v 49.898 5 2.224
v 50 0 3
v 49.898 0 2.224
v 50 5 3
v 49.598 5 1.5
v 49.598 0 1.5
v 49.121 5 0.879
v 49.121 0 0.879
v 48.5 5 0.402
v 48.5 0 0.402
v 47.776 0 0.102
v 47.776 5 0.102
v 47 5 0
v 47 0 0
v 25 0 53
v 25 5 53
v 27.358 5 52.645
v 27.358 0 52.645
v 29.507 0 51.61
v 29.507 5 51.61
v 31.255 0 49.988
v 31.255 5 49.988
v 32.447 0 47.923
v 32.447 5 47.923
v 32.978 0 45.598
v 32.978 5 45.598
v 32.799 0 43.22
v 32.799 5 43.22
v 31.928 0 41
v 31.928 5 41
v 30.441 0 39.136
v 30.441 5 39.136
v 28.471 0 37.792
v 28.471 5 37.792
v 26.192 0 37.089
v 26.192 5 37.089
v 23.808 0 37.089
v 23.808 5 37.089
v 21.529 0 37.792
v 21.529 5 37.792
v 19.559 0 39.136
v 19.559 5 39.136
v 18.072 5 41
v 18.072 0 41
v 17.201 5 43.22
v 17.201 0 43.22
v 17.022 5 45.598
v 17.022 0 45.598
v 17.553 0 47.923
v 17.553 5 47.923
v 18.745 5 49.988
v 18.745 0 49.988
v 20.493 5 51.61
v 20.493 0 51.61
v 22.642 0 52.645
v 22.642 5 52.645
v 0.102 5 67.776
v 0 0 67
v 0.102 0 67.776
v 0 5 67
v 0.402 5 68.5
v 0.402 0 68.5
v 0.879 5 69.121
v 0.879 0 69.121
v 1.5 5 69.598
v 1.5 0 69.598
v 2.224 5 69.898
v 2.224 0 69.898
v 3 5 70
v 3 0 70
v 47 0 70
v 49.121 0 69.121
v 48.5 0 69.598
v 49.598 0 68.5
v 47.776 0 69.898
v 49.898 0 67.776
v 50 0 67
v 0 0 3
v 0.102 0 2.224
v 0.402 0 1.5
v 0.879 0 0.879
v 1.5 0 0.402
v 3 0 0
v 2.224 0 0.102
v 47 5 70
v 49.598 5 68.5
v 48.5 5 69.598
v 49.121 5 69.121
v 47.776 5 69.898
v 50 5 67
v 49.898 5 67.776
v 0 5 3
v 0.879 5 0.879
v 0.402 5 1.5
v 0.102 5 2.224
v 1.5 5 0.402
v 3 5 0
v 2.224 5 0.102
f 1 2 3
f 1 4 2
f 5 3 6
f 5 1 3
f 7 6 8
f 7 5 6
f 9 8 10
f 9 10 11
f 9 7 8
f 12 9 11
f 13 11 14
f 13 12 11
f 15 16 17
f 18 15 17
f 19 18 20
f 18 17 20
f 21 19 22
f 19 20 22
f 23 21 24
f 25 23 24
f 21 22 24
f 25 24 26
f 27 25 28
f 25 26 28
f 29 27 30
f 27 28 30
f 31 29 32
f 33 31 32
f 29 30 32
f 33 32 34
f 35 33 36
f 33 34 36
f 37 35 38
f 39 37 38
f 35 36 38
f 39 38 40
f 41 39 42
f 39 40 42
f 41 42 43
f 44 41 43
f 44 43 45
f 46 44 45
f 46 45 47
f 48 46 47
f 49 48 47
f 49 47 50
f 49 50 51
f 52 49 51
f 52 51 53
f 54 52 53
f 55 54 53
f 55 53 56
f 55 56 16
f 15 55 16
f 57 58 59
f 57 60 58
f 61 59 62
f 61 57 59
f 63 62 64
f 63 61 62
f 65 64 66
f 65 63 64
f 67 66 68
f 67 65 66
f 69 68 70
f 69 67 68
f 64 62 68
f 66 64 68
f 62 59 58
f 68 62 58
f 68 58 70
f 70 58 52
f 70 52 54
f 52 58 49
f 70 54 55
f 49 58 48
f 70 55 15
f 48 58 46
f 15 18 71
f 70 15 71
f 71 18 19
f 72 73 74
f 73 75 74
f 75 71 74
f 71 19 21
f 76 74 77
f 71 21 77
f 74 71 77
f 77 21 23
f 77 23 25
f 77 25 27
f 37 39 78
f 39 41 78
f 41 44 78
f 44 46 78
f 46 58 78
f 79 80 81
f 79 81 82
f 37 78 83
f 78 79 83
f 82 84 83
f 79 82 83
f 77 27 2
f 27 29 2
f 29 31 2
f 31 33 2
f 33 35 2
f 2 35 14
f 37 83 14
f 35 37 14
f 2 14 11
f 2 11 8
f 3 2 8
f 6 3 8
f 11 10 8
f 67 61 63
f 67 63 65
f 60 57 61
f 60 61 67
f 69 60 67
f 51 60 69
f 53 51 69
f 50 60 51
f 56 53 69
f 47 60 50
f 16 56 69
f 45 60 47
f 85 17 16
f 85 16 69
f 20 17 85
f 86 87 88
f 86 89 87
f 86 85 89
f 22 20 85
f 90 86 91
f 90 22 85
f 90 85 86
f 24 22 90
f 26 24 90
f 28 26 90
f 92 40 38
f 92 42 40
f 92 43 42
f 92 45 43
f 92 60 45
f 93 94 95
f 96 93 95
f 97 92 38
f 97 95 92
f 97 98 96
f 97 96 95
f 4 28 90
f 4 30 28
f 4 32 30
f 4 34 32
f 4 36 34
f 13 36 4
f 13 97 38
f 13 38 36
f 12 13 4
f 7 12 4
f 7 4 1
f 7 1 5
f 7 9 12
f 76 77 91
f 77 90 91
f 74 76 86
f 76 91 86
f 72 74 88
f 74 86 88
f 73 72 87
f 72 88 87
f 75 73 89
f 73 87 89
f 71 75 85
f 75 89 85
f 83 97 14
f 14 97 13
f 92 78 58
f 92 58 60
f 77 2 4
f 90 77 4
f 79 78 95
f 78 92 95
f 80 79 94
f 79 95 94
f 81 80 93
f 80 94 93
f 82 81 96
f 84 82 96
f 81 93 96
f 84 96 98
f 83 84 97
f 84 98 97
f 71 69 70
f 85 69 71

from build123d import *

# Parameters (mm, degrees)
SKETCH_1_W             = 50
SKETCH_1_H             = 5
BLOCKEXTRUDE_DEPTH     = 70
FILLET_2_R             = 3
SKETCH_2_R             = 8
ROTARY_SEAL_SEAT_DEPTH = 87.168439698


with BuildPart() as part:
    # 草图1 → BlockExtrude (new body)
    with BuildSketch(Plane.XY):
        with Locations((25, 2.5)):
            Rectangle(SKETCH_1_W, SKETCH_1_H)
    extrude(amount=BLOCKEXTRUDE_DEPTH)

    # Fillet 2
    fillet_2_edges = [part.edges().sort_by_distance(p)[0] for p in [
        (50, 2.5, 70),
        (0, 2.5, 70),
        (50, 2.5, 0),
        (0, 2.5, 0),
    ]]
    fillet(fillet_2_edges, radius=FILLET_2_R)

    # 草图2 → Rotary_seal_seat (cut, through all)
    with BuildSketch(Plane(origin=(0, 5, 0), x_dir=(1, 0, 0), z_dir=(0, 1, 0))):
        with Locations(Location((25, -45, 0), (0, 0, 270))):
            Circle(SKETCH_2_R)
    extrude(amount=-ROTARY_SEAL_SEAT_DEPTH, mode=Mode.SUBTRACT)


solid = part.part
